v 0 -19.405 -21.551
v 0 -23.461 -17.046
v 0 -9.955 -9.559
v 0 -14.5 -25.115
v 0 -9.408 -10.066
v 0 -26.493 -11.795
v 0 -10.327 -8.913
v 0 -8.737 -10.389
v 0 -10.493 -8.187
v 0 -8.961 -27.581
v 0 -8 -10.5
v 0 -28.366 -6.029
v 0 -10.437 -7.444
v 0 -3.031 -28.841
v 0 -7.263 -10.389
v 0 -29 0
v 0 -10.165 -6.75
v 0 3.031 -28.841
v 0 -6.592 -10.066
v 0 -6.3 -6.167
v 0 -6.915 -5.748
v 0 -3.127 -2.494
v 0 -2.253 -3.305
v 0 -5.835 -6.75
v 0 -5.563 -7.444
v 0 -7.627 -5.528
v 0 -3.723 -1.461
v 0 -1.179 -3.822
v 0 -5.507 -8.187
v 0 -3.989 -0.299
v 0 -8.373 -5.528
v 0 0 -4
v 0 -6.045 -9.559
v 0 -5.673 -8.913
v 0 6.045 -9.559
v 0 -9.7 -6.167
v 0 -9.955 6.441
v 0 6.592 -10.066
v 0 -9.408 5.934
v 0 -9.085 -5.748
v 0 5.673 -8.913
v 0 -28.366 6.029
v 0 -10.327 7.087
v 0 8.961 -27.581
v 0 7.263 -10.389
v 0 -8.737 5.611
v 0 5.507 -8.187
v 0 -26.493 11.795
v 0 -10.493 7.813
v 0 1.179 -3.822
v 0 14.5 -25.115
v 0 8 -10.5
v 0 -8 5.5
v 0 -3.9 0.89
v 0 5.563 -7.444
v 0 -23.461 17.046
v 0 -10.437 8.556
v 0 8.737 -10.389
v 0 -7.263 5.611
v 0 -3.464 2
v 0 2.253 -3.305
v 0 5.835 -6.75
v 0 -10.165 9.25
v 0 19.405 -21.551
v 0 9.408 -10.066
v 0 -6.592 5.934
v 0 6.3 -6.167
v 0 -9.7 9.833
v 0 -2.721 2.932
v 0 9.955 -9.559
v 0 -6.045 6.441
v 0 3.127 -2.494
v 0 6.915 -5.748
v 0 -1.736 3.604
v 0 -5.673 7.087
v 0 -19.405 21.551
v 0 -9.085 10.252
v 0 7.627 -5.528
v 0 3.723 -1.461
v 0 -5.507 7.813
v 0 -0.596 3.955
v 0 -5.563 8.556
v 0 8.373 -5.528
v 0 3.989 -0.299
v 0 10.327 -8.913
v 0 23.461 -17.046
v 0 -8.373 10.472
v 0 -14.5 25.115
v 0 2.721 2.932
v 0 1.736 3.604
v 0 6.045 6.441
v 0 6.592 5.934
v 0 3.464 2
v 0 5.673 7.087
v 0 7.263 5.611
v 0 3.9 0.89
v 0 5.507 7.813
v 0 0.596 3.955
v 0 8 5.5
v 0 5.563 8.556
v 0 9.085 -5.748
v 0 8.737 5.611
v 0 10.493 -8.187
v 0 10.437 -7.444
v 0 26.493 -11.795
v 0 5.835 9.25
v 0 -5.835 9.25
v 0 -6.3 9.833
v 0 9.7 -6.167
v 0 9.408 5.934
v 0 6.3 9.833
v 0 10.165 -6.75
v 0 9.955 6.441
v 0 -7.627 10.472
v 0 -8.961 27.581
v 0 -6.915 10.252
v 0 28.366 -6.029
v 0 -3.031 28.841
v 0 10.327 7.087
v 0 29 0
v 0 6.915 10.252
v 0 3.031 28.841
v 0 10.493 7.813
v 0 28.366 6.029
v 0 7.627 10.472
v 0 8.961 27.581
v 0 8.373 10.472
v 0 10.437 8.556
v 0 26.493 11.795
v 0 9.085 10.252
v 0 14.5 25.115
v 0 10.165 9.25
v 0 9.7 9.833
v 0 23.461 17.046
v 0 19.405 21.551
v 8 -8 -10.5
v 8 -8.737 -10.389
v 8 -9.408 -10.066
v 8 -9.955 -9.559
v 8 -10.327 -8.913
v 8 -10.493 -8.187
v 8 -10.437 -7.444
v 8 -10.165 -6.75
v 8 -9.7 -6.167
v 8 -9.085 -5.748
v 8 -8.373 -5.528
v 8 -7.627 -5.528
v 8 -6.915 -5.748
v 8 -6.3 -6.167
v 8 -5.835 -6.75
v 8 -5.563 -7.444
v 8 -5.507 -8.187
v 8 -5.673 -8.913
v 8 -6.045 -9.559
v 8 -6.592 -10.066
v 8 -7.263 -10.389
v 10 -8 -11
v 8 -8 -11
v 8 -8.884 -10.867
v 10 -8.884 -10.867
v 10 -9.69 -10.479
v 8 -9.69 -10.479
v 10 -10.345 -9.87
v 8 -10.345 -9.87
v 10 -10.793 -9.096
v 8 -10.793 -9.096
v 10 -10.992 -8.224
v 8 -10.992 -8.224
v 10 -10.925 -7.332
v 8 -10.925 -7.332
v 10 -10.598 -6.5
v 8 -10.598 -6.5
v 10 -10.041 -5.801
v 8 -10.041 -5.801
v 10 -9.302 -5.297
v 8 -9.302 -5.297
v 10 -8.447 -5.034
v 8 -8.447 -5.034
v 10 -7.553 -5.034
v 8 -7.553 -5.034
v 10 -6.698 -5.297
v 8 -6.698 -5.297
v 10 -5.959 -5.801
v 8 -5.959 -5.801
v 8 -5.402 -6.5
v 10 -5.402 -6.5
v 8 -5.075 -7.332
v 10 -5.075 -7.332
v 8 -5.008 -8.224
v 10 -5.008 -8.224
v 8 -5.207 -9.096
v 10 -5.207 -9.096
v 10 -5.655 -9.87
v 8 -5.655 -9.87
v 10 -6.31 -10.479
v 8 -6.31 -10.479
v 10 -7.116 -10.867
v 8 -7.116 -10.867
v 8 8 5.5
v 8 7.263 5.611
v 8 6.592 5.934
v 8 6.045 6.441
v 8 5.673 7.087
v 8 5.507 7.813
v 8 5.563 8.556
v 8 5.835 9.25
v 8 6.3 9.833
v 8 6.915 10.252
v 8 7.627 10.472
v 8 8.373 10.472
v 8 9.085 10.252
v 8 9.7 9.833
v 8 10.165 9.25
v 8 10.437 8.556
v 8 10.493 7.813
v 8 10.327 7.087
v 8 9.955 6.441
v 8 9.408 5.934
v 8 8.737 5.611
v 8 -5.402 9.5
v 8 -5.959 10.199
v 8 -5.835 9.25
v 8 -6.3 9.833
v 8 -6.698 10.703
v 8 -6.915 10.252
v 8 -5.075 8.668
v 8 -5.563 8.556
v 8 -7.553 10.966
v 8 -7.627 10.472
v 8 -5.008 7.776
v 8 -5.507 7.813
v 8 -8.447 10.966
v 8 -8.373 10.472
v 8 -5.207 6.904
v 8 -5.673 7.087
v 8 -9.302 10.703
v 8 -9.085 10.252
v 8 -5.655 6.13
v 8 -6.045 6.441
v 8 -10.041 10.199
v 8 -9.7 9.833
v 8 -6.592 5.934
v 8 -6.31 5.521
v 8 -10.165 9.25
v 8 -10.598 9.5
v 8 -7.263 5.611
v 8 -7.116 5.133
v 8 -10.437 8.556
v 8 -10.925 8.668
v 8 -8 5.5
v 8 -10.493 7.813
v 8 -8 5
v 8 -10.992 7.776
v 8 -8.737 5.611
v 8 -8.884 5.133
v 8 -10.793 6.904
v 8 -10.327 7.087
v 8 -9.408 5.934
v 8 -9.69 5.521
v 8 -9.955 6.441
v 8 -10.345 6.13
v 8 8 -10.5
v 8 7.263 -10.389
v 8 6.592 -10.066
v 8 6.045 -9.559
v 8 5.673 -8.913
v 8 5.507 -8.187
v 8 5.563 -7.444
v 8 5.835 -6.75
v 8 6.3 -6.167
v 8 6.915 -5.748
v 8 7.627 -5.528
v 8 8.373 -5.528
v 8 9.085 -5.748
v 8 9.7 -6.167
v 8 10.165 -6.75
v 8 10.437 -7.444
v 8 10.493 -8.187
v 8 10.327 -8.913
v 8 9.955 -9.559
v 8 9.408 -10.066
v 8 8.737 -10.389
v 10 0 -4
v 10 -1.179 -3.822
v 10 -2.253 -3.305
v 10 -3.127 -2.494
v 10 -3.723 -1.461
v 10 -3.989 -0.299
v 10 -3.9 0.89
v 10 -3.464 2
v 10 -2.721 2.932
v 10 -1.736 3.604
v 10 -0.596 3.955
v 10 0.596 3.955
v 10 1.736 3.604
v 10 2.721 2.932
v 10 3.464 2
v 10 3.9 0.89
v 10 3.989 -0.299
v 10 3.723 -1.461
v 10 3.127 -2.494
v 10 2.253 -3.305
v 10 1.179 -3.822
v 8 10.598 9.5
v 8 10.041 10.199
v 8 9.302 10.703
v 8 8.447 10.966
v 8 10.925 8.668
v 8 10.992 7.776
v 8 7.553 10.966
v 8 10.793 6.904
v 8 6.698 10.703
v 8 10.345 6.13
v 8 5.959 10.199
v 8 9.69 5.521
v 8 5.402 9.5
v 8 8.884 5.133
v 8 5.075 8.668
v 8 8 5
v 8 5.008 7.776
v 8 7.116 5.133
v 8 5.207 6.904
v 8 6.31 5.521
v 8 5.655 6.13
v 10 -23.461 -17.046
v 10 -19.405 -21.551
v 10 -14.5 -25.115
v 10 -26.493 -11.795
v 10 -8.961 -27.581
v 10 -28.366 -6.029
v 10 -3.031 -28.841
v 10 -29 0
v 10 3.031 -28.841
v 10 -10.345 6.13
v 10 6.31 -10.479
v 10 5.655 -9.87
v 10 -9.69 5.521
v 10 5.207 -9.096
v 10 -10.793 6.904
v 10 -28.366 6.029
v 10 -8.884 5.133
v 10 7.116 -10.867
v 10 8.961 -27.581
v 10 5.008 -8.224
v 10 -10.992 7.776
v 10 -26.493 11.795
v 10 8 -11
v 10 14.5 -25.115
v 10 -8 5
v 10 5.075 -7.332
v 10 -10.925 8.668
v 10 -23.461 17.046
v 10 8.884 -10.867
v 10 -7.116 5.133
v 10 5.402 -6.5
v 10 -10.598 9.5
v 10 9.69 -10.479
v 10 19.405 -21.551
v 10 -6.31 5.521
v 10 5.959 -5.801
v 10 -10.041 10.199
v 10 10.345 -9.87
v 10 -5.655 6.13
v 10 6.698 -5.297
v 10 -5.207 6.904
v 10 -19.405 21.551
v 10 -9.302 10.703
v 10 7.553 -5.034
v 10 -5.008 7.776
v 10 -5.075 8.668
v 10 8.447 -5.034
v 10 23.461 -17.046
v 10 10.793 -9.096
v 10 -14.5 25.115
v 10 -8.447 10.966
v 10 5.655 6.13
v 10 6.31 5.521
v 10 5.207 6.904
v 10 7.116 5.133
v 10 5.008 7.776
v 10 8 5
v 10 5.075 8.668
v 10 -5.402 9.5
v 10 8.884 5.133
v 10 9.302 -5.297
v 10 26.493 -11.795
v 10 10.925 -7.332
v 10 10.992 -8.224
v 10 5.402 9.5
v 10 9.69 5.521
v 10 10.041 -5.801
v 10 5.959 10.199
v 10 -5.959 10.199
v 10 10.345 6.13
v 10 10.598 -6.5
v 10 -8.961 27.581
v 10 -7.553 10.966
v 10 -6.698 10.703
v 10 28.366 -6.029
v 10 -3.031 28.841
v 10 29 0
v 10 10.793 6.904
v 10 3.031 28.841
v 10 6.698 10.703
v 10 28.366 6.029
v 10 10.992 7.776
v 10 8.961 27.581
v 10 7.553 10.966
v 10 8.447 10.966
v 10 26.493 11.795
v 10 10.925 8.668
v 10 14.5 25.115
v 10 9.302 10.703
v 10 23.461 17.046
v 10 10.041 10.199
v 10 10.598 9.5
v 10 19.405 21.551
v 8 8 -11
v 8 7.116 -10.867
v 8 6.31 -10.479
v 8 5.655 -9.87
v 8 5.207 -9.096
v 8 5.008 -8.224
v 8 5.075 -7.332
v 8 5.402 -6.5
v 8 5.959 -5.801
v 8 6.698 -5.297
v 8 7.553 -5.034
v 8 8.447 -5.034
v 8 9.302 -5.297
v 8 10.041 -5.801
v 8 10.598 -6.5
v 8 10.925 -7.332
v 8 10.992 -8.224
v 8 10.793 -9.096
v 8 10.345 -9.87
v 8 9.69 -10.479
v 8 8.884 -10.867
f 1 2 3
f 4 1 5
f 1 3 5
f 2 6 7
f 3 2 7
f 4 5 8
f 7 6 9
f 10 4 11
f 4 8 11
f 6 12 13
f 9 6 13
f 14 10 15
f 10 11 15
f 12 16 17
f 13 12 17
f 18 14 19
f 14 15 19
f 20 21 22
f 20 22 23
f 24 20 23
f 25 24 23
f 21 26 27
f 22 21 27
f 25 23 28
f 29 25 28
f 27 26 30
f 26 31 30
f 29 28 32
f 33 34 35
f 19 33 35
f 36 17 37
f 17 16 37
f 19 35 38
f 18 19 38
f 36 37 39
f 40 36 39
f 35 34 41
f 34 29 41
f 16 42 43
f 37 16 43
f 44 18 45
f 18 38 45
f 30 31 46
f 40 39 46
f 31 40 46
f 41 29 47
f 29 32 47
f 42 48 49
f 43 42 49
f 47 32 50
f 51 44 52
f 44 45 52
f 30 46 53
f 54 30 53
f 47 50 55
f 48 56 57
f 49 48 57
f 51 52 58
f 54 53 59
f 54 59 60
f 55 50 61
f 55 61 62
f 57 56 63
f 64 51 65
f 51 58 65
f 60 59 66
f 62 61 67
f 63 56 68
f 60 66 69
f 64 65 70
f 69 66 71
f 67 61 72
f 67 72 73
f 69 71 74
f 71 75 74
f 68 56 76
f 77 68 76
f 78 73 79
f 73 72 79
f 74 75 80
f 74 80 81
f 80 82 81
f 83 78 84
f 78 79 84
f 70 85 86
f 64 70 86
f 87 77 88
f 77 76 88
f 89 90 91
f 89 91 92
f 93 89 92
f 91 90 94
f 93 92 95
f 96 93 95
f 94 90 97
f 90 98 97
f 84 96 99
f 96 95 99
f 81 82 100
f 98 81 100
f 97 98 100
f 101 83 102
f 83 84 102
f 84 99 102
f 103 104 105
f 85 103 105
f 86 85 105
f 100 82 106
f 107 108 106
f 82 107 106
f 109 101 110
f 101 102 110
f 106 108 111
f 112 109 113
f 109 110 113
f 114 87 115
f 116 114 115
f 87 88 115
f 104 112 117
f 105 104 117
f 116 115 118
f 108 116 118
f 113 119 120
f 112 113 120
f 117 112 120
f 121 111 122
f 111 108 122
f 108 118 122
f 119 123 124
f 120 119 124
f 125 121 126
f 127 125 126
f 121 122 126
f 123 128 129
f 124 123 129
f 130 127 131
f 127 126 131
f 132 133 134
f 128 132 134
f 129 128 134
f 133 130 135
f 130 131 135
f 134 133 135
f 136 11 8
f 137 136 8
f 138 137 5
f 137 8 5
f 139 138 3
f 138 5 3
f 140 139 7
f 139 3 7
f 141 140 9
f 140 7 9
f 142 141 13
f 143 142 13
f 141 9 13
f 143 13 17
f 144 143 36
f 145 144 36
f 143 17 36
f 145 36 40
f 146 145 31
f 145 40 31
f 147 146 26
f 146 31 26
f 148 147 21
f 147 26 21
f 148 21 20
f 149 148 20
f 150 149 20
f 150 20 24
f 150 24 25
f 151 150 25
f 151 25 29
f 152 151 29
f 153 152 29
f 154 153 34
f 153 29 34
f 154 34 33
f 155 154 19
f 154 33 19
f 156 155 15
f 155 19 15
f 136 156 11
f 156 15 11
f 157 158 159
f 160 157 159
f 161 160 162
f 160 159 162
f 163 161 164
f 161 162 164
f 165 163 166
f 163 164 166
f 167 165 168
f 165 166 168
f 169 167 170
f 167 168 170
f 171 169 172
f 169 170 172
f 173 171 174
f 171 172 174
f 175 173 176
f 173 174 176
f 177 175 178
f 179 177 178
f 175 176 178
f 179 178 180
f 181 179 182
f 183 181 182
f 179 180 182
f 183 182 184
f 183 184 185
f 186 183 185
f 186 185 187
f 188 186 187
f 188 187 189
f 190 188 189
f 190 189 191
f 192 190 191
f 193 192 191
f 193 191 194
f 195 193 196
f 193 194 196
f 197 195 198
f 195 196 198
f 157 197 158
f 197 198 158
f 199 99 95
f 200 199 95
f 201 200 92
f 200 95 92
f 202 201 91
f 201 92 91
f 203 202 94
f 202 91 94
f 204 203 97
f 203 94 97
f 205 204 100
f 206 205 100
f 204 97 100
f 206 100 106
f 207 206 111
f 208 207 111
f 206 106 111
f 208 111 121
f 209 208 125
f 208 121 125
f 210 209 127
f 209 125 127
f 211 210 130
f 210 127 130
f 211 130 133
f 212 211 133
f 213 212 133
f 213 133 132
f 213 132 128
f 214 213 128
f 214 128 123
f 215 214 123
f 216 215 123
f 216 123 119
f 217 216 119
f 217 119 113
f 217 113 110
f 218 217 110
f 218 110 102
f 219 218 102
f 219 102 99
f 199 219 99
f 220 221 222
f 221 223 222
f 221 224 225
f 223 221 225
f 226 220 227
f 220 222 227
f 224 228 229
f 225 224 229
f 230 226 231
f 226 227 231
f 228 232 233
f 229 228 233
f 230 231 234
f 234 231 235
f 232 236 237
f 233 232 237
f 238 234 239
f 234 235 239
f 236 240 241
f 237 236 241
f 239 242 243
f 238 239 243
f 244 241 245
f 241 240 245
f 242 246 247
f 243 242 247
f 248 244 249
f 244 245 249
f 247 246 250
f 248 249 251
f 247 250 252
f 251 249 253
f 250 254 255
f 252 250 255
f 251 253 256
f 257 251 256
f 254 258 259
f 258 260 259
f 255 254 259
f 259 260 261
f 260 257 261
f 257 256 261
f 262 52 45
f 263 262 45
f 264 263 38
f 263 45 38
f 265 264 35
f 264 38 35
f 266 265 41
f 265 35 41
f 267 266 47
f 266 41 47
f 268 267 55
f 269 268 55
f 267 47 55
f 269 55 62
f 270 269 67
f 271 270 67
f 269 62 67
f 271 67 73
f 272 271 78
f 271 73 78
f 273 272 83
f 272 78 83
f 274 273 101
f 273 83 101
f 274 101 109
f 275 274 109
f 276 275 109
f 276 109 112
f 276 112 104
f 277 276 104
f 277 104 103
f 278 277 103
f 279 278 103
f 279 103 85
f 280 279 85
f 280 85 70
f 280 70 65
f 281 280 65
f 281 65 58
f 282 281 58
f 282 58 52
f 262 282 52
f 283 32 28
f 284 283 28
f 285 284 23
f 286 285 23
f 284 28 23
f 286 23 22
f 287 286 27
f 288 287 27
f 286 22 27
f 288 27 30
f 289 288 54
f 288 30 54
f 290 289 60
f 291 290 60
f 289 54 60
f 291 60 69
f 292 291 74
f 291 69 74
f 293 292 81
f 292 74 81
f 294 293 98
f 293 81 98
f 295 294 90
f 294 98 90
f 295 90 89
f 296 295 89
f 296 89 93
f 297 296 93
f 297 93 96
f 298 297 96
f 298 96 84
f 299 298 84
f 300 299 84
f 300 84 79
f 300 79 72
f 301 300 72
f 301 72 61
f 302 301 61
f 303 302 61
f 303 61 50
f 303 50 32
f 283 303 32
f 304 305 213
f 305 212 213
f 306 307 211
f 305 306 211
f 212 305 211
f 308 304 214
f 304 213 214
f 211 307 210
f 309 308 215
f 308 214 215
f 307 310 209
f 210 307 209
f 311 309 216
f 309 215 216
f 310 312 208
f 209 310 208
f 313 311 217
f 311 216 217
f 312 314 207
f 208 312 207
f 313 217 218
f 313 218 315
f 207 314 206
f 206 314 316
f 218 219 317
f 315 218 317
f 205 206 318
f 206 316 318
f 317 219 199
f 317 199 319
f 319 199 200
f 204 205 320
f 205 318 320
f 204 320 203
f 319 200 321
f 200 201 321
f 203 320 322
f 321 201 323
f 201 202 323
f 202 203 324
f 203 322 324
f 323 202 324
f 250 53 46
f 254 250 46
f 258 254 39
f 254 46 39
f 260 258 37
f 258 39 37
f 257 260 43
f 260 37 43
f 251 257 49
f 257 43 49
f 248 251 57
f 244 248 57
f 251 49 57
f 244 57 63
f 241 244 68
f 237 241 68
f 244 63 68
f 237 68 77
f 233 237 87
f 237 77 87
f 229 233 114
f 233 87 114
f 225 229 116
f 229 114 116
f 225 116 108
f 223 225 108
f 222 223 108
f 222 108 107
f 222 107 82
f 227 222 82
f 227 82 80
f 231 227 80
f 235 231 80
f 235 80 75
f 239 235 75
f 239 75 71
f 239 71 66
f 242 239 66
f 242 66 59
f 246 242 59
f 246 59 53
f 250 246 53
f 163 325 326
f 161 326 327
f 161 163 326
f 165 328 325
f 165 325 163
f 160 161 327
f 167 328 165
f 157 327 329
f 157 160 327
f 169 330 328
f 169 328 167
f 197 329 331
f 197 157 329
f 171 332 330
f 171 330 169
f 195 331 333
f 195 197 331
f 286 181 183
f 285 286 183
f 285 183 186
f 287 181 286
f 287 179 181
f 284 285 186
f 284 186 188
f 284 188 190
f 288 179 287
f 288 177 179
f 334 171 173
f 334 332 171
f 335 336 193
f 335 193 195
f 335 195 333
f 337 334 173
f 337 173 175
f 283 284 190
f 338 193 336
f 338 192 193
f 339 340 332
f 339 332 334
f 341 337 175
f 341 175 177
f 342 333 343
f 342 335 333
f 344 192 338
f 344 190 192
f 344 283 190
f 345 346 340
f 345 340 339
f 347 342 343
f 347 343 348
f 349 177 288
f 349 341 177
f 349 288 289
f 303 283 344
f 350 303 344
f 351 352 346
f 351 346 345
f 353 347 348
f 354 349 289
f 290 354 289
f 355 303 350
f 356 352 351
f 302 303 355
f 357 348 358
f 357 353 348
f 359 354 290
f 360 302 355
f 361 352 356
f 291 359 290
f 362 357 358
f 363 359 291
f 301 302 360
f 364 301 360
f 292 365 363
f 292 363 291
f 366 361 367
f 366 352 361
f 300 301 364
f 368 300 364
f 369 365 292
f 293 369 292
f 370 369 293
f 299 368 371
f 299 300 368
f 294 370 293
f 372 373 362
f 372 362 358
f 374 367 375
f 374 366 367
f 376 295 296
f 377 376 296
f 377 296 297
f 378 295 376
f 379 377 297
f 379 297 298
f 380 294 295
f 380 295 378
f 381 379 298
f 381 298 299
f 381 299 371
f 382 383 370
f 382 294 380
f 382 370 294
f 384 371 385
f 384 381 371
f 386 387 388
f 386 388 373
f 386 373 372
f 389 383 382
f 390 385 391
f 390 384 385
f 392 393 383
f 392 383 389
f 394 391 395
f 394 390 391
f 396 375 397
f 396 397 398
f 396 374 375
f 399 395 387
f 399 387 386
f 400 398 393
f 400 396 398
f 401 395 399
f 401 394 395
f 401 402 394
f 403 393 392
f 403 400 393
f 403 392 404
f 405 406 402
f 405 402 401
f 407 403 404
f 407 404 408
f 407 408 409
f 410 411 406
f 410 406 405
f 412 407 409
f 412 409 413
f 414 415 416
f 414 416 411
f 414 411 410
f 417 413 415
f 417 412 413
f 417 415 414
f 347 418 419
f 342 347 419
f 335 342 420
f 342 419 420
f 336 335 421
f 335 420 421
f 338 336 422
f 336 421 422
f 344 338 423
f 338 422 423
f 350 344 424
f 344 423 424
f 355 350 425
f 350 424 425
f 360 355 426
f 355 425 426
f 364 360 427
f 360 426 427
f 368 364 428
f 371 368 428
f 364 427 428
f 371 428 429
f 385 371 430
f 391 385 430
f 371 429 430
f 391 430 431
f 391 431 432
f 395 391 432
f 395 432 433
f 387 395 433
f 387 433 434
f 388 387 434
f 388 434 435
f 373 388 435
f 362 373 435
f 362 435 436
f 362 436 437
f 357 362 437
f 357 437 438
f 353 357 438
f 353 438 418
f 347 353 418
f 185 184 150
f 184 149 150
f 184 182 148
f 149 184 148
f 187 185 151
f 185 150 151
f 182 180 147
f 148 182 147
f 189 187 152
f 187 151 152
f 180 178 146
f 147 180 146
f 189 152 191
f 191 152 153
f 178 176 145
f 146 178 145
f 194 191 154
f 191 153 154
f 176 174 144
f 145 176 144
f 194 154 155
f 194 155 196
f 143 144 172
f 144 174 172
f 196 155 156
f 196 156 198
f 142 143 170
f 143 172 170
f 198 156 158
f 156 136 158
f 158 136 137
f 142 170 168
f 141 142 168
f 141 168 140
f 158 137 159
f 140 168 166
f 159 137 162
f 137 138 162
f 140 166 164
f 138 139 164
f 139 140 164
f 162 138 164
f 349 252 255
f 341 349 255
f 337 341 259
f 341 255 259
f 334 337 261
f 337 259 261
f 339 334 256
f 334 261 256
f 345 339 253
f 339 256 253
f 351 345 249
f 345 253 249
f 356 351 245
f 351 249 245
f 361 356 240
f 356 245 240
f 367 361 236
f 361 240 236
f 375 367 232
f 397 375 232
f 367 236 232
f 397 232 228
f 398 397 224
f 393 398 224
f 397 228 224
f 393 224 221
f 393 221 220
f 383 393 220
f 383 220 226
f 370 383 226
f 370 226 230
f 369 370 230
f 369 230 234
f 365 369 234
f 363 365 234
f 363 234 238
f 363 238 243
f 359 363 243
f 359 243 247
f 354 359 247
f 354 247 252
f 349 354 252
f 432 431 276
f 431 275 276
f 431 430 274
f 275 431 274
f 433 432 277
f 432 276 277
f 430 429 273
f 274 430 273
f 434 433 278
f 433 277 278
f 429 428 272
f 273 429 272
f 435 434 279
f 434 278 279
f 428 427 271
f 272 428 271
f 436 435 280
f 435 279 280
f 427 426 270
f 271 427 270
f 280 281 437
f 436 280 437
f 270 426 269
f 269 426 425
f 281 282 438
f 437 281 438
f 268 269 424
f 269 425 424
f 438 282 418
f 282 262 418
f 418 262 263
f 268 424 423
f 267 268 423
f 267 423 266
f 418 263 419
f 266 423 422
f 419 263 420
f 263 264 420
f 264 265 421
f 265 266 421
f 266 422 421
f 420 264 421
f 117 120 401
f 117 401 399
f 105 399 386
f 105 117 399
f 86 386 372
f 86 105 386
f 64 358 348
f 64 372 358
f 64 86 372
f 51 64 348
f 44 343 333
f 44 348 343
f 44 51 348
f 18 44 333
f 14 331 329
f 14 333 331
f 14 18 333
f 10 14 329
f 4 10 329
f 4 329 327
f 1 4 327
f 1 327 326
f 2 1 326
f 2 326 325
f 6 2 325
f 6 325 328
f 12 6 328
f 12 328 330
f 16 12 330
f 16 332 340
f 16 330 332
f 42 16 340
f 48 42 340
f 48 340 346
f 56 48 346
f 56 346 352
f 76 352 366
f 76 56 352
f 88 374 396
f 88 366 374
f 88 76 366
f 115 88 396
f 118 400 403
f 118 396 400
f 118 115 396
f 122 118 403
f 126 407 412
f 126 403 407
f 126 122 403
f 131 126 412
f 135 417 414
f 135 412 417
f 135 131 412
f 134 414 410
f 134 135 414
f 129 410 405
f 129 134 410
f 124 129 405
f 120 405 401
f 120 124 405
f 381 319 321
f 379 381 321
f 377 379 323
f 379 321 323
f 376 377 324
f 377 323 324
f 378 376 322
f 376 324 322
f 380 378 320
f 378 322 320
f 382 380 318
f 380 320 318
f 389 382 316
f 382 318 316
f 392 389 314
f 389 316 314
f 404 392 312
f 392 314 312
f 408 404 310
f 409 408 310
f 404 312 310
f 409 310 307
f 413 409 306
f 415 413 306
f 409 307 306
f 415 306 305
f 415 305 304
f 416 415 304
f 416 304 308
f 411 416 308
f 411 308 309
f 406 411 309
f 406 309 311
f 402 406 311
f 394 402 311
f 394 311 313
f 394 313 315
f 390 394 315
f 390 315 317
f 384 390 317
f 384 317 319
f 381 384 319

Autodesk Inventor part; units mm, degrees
ref_plane "YZ Plane" through (0, 0, 0) normal (1, 0, 0) x (0, 1, 0)
ref_plane "XZ Plane" through (0, 0, 0) normal (0, 1, 0) x (-1, 0, 0)
ref_plane "XY Plane" through (0, 0, 0) normal (0, 0, 1) x (1, 0, 0)
sketch "Sketch1" plane through (0, 0, 0) normal (1, 0, 0) x (0, 1, 0)
  circle A0 centre (0, 0) radius 29
  circle A1 centre (0, 0) radius 29 projected
  dimension "d0" = 58
  dimension "d22" = 58
extrude "Extrusion1" add sketch "Sketch1" along normal blind 10
sketch "Sketch2" plane through (10, 0, 0) normal (1, 0, 0) x (0, 0, -1)
  point P0 (0, 0)
  point P1 (-8, 8)
  point P2 (8, 8)
  point P3 (8, -8)
  point P4 (-8, -8)
  dimension "d3" = 8
  dimension "d4" = 8
  dimension "d5" = 16
  dimension "d6" = 16
hole "Hole1" at (10, 8, 8) at (10, 8, -8) at (10, -8, -8) at (10, -8, 8) direction (-1, 0, 0) diameter 5 end through all counterbore diameter 6 counterbore depth 2
sketch "Sketch3" plane through (10, 0, 0) normal (1, 0, 0) x (0, 0, -1)
  point P0 (0, 0)
  point P1 (0, 0)
hole "Hole2" at (10, 0, 0) direction (-1, 0, 0) diameter 8 end through all
equation "\"d0\" = d22"
equation "\"d5\" = 2 * d3"
equation "\"d6\" = d5"
properties part number "Tapon 1_Cabeza"
